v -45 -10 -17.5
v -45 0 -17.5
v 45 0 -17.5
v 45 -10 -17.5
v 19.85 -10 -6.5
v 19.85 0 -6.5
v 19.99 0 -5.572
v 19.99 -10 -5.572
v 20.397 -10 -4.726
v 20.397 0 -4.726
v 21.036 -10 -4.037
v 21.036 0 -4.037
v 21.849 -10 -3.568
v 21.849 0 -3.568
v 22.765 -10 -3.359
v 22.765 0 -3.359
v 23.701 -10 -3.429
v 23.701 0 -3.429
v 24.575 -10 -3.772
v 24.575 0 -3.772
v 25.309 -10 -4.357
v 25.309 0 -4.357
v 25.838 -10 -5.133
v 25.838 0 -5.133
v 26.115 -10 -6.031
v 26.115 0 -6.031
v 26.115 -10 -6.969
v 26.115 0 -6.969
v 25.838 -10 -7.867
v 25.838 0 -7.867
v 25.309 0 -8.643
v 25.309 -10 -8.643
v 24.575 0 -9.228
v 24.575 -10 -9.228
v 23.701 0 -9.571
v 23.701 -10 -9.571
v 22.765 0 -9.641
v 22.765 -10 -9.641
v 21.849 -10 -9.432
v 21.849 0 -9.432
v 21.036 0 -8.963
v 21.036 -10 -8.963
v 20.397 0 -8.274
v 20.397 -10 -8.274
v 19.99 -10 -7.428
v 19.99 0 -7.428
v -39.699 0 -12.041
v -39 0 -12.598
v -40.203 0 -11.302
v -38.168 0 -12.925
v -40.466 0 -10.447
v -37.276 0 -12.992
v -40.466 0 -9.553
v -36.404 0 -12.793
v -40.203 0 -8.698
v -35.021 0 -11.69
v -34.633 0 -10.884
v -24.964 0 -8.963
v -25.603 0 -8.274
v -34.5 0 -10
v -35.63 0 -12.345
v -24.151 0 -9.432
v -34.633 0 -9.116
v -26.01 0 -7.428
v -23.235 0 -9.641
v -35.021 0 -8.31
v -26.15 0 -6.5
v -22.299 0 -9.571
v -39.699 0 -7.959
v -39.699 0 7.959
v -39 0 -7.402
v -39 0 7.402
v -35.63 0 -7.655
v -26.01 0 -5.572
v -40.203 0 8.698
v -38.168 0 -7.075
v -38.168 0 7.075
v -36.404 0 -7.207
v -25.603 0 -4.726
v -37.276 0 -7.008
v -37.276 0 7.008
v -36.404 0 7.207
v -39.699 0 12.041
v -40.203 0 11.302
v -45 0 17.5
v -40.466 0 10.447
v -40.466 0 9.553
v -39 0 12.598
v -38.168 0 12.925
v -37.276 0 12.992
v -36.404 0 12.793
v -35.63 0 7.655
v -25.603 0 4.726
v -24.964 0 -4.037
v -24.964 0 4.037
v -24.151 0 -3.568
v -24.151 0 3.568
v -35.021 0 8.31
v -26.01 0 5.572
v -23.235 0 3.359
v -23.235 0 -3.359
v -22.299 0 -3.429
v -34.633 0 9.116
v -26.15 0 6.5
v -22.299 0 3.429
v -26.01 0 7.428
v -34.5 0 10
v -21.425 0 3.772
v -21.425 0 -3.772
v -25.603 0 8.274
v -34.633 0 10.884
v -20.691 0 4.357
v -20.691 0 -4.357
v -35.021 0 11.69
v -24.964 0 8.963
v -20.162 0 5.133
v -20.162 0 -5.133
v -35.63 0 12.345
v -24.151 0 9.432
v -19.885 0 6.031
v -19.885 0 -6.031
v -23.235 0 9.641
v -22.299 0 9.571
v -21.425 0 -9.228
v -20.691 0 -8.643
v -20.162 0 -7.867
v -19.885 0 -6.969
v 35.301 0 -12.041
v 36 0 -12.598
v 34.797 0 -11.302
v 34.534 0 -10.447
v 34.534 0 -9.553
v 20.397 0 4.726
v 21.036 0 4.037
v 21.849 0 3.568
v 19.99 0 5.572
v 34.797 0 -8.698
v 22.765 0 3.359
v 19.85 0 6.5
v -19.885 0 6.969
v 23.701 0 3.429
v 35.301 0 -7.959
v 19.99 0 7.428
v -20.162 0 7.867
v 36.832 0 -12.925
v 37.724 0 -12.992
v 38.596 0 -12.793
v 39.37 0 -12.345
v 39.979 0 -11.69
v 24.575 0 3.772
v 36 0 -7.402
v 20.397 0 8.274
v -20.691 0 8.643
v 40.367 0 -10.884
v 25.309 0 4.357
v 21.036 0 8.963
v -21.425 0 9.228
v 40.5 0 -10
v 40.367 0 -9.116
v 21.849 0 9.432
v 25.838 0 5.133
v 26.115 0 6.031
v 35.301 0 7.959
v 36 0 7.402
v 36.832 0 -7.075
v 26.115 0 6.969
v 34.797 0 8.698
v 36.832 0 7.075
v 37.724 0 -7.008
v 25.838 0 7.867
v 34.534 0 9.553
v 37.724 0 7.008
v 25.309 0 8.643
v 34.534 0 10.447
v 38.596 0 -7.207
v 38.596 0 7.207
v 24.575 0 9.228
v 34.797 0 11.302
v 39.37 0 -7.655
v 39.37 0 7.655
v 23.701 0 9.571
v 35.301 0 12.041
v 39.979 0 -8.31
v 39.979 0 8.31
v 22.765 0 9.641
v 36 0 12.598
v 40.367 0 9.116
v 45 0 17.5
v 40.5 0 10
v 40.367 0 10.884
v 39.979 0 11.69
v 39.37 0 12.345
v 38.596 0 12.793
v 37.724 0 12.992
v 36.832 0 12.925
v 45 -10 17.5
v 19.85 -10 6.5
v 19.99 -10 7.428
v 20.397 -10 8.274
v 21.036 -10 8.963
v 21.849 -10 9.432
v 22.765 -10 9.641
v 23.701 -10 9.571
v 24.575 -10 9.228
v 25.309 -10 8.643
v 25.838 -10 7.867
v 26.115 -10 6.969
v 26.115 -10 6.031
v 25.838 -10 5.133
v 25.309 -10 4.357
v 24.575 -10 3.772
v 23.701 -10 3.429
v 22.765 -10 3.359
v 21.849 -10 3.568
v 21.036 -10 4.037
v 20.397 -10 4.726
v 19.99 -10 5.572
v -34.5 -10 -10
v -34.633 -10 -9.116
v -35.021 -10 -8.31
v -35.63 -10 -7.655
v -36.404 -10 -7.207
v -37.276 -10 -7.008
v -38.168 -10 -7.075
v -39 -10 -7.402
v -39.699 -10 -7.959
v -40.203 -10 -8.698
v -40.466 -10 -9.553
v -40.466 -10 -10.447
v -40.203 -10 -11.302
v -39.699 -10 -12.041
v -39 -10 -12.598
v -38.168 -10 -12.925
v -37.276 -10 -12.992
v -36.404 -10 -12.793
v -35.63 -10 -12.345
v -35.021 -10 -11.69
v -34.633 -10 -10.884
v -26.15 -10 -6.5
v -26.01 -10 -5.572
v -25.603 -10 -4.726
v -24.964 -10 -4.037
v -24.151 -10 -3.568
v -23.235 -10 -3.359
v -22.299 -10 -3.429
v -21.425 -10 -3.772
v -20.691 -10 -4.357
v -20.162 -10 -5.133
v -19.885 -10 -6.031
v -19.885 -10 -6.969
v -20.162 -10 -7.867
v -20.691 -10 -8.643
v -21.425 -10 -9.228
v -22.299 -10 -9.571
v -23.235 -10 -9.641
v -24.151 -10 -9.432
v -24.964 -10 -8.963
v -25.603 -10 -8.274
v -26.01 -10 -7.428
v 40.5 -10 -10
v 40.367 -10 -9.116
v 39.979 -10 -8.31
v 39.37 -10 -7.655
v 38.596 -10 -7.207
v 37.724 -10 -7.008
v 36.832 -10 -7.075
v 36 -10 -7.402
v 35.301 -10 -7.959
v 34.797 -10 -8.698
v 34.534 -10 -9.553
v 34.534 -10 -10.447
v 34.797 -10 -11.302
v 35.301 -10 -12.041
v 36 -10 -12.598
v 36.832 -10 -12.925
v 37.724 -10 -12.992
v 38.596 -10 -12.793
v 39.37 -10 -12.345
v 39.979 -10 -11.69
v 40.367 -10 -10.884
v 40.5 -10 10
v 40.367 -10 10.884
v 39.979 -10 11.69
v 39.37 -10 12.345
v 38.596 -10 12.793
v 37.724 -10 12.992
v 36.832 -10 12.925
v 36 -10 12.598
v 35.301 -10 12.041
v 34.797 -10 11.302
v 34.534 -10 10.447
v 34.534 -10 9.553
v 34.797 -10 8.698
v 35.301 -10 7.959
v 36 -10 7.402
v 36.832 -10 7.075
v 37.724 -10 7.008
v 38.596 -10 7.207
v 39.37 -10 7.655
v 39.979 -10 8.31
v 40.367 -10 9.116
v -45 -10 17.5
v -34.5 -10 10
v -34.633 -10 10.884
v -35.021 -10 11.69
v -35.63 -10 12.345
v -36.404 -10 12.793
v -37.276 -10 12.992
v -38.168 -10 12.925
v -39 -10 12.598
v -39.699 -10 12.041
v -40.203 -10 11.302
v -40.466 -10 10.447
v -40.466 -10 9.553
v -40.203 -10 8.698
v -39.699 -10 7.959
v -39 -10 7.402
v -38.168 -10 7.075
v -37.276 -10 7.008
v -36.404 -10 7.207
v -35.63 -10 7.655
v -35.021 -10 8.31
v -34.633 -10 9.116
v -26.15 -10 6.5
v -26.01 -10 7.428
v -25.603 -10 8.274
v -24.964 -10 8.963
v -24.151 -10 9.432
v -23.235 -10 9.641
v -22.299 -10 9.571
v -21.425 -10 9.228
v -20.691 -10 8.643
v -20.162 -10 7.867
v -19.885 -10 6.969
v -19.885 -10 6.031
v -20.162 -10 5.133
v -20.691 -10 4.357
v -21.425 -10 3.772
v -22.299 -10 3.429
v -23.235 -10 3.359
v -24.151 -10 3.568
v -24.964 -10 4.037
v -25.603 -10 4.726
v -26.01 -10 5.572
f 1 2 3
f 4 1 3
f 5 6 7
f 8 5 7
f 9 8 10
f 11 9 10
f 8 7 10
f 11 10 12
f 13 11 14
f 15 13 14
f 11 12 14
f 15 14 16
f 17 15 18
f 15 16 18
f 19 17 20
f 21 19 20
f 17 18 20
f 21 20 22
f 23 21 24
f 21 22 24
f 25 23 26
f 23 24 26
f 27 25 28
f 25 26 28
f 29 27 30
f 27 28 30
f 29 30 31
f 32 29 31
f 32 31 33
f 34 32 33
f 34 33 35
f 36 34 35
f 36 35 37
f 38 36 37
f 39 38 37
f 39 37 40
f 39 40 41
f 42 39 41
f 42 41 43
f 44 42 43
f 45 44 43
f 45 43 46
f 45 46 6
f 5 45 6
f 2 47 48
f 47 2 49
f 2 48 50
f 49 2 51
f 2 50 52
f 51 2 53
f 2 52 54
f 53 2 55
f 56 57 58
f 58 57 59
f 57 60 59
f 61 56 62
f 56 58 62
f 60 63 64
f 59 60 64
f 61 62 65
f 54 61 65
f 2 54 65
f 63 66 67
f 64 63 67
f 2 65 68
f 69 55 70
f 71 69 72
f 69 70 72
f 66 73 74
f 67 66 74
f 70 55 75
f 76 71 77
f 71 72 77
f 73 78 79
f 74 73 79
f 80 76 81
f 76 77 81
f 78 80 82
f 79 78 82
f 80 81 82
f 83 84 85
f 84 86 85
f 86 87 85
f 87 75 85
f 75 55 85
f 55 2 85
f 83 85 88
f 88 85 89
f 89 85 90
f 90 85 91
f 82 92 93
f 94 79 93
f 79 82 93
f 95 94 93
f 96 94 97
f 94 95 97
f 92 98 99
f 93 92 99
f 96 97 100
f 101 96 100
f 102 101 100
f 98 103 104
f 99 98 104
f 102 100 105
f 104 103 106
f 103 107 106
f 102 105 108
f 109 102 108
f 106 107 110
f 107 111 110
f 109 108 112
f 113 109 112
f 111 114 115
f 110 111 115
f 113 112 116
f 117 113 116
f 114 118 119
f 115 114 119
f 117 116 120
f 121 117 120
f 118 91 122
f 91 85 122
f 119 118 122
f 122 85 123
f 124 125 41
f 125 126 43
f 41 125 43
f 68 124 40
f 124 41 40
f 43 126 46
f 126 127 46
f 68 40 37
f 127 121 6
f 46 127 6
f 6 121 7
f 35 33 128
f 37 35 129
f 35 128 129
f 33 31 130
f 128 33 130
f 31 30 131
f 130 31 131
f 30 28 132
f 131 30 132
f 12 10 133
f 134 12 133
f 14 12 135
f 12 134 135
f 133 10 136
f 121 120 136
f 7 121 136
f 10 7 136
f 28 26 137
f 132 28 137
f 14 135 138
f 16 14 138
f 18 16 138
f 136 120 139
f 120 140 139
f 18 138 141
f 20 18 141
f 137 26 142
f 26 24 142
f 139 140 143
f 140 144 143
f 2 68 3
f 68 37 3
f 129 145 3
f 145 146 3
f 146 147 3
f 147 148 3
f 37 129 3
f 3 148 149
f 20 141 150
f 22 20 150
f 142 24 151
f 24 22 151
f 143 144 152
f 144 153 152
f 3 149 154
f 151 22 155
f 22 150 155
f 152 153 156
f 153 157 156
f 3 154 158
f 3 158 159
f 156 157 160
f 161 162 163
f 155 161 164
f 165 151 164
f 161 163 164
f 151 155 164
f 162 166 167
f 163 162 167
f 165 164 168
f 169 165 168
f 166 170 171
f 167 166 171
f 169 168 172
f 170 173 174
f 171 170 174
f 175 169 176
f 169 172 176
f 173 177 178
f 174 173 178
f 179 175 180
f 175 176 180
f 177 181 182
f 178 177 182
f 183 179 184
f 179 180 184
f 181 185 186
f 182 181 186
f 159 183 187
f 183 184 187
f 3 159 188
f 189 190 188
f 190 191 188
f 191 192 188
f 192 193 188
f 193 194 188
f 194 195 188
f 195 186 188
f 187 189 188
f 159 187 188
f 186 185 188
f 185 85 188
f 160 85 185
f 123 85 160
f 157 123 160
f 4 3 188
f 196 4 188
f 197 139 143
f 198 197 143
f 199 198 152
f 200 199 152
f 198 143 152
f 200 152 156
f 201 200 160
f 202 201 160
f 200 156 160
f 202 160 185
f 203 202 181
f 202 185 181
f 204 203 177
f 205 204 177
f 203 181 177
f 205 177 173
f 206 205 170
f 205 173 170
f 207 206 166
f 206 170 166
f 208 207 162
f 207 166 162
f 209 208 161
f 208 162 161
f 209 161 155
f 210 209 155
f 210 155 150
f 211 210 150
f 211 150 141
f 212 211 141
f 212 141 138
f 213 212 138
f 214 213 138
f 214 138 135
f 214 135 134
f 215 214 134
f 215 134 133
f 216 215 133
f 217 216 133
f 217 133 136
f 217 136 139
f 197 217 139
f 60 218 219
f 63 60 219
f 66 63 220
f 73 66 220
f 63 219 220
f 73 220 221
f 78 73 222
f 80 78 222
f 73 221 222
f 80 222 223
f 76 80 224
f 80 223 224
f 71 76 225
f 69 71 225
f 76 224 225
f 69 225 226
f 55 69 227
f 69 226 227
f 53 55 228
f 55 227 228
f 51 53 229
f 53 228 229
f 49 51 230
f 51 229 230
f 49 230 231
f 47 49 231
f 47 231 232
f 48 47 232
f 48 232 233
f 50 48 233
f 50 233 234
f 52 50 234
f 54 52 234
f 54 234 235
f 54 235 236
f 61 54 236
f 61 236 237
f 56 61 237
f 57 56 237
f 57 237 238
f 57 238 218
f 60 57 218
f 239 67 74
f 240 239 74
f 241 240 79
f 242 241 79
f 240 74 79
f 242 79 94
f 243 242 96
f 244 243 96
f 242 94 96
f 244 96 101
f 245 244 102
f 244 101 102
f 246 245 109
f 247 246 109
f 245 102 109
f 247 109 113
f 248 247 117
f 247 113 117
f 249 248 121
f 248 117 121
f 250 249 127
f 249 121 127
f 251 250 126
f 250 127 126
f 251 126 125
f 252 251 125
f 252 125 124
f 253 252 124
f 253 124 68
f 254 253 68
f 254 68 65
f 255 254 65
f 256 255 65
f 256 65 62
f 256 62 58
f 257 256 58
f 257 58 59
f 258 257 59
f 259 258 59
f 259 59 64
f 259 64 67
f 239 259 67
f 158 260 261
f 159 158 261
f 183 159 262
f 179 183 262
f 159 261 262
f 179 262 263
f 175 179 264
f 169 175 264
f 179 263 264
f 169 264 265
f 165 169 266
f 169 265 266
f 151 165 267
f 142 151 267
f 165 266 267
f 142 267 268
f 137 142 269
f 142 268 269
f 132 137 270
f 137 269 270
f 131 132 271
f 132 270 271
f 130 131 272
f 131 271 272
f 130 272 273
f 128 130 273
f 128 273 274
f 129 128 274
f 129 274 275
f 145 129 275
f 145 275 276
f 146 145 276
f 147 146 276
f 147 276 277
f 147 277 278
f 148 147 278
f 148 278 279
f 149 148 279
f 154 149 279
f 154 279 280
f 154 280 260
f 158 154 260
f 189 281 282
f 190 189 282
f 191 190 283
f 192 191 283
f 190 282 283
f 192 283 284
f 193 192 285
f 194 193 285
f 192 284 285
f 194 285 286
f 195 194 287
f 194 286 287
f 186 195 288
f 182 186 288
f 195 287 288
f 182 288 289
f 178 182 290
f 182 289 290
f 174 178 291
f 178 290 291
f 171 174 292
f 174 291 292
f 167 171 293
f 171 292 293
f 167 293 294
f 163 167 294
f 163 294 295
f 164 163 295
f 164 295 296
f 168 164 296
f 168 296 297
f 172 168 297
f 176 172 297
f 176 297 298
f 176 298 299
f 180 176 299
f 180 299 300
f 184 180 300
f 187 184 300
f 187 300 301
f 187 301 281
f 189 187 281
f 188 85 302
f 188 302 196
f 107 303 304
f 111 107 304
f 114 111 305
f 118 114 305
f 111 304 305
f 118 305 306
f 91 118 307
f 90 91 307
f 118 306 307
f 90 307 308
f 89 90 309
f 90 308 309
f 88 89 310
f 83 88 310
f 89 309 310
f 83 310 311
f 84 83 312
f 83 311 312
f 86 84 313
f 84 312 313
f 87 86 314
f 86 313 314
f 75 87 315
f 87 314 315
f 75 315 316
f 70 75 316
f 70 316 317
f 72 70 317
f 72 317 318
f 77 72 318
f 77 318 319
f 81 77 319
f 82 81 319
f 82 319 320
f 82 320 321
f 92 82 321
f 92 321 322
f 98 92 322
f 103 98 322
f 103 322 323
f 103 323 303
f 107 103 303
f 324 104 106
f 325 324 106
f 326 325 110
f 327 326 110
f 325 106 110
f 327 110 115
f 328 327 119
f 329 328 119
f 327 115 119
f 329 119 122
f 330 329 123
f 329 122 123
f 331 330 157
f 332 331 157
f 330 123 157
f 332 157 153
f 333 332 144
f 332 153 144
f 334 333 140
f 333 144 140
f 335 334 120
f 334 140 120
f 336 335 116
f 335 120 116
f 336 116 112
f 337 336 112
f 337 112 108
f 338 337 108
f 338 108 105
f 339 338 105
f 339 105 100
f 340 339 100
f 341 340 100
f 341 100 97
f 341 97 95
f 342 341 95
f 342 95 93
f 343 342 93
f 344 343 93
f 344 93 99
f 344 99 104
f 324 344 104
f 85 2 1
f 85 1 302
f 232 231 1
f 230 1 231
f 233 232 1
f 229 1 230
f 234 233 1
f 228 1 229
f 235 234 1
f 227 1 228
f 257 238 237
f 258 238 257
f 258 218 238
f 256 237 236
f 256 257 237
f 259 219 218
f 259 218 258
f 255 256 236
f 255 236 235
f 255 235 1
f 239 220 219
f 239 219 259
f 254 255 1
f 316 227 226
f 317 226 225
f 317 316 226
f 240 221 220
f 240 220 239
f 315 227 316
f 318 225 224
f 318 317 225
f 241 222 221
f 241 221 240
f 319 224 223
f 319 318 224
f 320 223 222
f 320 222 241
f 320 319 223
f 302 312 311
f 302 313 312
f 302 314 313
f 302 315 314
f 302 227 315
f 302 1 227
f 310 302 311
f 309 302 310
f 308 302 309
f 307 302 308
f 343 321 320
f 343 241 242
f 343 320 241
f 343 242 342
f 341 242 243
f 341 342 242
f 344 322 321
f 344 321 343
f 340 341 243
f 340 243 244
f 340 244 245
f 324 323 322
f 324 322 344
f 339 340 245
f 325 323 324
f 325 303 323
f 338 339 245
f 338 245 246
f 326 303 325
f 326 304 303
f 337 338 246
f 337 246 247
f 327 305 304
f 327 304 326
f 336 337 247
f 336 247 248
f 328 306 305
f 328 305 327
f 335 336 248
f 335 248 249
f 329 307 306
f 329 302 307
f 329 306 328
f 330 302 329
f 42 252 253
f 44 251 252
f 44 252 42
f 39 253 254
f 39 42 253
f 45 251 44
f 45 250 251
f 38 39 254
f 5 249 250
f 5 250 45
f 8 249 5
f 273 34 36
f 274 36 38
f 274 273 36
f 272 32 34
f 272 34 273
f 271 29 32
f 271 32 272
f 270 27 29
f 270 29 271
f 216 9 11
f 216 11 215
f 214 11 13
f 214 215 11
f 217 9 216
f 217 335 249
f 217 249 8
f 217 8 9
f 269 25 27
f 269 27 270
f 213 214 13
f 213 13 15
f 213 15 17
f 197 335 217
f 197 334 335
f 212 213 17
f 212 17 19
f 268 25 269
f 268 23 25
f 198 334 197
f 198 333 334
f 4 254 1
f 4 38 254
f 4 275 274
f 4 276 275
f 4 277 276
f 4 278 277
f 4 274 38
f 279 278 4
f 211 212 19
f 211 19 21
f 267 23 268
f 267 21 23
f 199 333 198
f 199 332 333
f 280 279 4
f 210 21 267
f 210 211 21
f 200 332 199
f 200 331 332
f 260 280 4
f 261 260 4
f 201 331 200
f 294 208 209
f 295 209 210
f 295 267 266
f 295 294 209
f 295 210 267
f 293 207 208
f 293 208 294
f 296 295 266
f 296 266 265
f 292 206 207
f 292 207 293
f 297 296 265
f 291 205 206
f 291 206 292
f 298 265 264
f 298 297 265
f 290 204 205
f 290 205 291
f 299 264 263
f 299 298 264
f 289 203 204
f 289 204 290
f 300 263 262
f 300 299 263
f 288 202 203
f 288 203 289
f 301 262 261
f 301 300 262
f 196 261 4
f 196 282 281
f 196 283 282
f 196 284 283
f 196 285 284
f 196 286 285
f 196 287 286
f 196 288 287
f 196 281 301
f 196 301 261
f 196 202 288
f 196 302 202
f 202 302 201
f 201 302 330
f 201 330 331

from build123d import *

# Parameters (mm, degrees)
F0_W     = 90
F0_H     = 35
F1_DEPTH = 10
F3_R     = 3
F4_DEPTH = 10.001
F5_D     = 6.3
F5_DEPTH = 20
F5_TIP   = 1.8927109499


with BuildPart() as f1:
    # F0 (on Front) → F1 (new body)
    with BuildSketch(Plane.XZ):
        Rectangle(F0_W, F0_H)
    extrude(amount=F1_DEPTH)

    # F3 (on face) → F4 (cut, through all)
    with BuildSketch(Plane.XZ.offset(10)):
        with Locations((-37.5, 10)):
            Circle(F3_R)
        with Locations((-37.5, -10)):
            Circle(F3_R)
        with Locations((37.5, -10)):
            Circle(F3_R)
        with Locations((37.5, 10)):
            Circle(F3_R)
    extrude(amount=-F4_DEPTH, mode=Mode.SUBTRACT)

    # F5
    with Locations(Plane.XZ.offset(10)):
        with Locations((-23, 6.5), (-23, -6.5), (23, -6.5), (23, 6.5)):
            Hole(F5_D / 2, depth=F5_DEPTH)
            with Locations((0, 0, -(F5_DEPTH + F5_TIP / 2))):  # 118° drill point
                Cone(0, F5_D / 2, F5_TIP, mode=Mode.SUBTRACT)


solid = f1.part
